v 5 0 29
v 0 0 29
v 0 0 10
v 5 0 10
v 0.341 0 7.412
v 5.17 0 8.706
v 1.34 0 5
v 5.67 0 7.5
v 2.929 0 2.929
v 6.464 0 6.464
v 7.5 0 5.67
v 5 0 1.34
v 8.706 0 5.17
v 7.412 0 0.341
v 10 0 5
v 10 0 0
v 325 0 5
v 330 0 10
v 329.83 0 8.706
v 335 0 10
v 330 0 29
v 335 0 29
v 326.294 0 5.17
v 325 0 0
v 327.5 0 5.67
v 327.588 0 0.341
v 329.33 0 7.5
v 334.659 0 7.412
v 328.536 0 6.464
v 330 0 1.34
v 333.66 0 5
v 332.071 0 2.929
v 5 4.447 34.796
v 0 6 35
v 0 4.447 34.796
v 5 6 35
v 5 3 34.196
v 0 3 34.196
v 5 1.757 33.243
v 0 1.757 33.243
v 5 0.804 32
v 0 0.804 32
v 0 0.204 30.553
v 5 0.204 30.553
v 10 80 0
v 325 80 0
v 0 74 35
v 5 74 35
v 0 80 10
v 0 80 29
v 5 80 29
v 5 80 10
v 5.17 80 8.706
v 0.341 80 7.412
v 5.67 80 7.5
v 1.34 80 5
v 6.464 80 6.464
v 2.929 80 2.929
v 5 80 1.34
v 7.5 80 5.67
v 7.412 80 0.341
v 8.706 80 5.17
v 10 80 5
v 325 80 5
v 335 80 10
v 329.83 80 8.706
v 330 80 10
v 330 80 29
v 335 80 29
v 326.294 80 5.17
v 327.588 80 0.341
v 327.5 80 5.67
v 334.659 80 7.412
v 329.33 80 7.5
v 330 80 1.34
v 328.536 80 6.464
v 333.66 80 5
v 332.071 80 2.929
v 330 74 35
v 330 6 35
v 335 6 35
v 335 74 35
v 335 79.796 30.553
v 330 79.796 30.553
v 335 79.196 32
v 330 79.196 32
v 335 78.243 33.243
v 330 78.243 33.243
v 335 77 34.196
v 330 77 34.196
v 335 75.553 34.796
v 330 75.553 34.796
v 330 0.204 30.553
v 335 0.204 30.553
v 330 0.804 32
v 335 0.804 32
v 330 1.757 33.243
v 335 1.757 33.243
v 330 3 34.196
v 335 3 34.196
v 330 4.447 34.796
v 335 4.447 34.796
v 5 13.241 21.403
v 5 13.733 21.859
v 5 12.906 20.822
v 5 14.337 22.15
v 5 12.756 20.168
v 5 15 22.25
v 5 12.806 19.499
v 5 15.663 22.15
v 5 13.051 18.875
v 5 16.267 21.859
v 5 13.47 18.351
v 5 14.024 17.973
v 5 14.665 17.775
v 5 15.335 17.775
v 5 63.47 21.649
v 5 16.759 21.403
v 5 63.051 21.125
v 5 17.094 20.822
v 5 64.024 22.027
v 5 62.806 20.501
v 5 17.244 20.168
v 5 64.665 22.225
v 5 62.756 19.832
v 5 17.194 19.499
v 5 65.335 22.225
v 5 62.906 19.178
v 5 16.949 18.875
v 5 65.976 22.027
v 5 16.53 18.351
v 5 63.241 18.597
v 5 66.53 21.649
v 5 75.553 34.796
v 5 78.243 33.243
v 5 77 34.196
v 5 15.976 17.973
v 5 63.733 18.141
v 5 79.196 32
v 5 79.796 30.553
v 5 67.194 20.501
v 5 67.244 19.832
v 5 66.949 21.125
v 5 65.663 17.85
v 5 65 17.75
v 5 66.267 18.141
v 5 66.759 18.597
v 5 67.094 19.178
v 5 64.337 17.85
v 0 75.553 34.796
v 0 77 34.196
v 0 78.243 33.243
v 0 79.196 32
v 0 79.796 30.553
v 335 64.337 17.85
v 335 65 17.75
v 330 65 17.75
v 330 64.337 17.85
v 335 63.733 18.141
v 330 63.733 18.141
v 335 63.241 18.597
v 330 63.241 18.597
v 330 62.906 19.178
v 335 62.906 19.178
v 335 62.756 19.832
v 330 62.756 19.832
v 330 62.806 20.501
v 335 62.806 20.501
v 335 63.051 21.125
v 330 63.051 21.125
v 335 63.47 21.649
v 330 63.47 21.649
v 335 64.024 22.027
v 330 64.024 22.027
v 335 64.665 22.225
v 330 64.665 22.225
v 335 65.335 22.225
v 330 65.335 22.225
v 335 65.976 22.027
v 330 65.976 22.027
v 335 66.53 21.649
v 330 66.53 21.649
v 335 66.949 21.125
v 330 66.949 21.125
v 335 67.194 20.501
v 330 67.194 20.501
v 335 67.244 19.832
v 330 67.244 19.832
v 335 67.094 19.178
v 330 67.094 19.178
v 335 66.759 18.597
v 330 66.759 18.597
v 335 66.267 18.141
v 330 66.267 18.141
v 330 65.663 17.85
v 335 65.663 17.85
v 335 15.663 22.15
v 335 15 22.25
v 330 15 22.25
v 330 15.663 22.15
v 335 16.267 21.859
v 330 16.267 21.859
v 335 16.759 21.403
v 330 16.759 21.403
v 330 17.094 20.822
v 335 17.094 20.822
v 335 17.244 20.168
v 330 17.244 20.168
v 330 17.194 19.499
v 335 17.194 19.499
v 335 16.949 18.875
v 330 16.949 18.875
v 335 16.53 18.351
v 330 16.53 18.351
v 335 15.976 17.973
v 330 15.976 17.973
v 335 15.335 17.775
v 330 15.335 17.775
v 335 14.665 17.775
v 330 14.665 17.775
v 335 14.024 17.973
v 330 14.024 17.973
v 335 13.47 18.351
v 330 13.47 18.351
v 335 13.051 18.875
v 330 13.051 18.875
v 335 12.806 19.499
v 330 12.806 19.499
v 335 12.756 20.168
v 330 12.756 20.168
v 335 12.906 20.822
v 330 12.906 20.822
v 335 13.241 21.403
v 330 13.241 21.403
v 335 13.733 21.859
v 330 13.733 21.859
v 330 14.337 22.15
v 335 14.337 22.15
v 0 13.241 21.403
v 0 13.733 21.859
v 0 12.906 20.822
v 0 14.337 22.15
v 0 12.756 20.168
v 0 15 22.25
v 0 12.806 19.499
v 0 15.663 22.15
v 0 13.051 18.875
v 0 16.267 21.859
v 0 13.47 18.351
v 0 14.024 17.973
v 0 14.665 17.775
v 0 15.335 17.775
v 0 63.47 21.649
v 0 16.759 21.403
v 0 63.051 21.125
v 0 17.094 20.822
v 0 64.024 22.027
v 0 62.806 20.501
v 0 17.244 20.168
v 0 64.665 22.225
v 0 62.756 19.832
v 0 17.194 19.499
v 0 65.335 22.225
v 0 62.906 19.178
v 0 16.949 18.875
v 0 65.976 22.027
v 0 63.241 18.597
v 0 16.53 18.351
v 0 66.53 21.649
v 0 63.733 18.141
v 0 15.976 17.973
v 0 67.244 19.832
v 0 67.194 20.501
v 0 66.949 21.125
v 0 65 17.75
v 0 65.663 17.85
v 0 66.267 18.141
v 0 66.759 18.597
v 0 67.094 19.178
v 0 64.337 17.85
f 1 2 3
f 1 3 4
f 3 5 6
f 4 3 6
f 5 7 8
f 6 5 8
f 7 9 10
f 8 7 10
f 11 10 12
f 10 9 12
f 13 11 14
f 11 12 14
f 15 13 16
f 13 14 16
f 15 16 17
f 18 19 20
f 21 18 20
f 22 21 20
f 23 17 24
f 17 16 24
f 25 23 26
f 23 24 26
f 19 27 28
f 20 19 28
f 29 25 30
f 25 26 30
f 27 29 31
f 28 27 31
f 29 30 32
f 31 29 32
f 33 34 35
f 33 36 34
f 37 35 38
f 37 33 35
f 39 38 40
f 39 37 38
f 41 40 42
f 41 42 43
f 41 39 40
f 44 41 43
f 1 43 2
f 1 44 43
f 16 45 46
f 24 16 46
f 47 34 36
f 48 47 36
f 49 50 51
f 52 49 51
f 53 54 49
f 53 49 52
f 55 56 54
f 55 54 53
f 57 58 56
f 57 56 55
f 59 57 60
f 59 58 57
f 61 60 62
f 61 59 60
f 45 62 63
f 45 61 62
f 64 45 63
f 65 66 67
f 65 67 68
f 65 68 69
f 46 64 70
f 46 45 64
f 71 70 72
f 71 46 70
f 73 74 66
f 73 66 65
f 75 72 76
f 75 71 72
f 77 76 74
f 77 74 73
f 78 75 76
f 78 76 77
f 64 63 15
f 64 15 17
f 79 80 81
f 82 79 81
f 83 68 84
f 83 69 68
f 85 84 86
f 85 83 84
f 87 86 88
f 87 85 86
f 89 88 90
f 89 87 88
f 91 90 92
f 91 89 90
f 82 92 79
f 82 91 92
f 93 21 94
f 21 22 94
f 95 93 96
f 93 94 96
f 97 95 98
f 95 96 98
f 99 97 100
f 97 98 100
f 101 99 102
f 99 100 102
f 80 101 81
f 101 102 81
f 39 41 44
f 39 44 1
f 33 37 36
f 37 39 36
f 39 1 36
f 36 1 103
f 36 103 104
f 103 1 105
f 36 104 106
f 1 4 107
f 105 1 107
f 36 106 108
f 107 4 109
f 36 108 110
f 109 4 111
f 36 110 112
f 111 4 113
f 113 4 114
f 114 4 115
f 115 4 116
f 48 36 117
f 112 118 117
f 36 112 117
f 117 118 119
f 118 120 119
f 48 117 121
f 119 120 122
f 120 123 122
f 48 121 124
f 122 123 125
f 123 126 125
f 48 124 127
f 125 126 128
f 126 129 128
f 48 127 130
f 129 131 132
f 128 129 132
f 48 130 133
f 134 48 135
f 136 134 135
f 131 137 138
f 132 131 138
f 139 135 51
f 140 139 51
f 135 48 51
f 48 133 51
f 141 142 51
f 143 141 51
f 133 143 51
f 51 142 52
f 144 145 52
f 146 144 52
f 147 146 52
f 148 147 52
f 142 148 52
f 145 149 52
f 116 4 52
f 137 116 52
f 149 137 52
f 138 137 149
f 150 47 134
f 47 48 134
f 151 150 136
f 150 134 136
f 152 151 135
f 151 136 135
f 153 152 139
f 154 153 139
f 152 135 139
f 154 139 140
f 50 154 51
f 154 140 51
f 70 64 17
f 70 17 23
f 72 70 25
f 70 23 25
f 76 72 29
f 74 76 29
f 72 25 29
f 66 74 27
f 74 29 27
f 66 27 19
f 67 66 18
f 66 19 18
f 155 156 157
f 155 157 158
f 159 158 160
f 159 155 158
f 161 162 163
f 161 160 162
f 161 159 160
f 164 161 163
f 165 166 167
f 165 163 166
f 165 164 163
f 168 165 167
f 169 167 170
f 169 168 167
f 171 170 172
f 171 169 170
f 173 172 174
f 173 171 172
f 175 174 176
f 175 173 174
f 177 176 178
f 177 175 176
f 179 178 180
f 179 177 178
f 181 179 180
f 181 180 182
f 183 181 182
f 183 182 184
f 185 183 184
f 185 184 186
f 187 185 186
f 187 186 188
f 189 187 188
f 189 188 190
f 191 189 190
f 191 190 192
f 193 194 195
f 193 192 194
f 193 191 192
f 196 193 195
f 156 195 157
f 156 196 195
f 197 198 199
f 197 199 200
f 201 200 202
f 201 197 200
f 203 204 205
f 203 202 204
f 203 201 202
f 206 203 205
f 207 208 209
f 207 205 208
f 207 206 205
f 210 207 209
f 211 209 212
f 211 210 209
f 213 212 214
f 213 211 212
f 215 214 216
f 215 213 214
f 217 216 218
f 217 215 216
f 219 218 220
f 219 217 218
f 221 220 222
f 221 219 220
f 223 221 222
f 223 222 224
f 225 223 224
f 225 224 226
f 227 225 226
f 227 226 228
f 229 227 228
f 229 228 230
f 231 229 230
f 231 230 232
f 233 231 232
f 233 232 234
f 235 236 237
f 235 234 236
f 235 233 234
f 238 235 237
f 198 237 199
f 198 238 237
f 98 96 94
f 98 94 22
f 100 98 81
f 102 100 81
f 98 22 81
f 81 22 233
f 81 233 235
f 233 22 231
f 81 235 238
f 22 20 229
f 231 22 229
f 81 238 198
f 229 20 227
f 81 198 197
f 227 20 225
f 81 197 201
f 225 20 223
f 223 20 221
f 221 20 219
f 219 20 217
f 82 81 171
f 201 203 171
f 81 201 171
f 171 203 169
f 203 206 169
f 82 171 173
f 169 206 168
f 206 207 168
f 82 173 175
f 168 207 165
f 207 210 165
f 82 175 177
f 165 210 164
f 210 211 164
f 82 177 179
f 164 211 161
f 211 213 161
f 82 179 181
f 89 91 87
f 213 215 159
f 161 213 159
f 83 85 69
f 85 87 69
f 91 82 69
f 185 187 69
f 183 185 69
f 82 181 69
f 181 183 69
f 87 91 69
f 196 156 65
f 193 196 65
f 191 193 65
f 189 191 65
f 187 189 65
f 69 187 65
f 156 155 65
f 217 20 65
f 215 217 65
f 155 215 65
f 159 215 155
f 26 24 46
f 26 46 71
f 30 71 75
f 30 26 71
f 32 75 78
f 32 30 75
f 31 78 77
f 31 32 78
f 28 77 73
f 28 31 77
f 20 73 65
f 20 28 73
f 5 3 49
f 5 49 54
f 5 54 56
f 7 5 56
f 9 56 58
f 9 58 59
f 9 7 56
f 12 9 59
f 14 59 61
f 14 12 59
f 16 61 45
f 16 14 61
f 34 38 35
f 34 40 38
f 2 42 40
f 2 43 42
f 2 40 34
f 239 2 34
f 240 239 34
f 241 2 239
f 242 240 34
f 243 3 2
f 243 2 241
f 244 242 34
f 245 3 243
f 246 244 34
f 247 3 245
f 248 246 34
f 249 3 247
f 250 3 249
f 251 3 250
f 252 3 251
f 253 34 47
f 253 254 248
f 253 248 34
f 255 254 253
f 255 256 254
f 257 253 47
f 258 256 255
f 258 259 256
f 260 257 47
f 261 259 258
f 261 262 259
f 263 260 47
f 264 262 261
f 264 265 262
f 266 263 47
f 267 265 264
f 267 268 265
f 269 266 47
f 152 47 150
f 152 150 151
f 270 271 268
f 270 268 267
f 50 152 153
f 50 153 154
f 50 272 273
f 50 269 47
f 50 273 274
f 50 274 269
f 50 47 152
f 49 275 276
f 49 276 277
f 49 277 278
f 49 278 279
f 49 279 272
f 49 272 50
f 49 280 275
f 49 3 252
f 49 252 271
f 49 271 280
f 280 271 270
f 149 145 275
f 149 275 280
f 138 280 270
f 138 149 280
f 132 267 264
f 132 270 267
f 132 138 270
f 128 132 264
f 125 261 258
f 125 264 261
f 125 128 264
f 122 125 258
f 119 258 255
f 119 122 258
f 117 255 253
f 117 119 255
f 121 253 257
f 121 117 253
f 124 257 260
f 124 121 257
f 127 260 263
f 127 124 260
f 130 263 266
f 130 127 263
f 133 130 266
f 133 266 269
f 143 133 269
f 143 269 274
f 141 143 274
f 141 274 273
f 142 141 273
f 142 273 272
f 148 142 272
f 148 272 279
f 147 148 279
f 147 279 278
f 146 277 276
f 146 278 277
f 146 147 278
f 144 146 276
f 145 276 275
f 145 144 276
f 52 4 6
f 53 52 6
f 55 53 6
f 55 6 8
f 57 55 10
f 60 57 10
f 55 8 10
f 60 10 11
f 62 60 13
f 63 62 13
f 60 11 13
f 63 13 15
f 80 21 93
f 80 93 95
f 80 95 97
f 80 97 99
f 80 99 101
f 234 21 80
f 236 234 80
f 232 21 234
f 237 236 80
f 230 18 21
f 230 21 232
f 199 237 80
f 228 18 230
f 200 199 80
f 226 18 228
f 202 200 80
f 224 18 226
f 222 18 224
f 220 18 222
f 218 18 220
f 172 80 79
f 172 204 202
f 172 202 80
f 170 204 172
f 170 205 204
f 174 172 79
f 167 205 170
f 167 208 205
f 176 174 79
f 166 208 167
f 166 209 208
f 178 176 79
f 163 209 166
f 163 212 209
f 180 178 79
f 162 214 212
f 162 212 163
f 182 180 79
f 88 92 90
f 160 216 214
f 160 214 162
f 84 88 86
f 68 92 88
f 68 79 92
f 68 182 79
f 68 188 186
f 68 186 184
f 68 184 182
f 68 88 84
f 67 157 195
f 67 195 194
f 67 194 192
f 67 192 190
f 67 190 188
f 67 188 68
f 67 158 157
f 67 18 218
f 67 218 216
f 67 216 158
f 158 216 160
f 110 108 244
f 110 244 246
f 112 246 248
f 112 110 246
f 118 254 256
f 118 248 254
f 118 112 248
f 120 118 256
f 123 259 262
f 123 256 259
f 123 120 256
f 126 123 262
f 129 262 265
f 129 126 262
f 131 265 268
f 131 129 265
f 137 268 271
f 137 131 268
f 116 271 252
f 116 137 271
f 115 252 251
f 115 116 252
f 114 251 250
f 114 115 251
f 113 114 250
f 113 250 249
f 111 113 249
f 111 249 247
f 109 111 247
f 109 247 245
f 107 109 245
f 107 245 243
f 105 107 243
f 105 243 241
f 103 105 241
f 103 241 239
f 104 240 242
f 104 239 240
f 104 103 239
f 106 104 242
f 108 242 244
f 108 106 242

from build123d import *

# Parameters (mm, degrees)
ESQUISSE1_W                  = 335
ESQUISSE1_H                  = 80
BOSS_EXTRU_1_DEPTH           = 5
ESQUISSE2_W                  = 5
ESQUISSE2_H                  = 80
BOSS_EXTRU_2_DEPTH           = 30
ENL_V_MAT_EXTRU_1_DEPTH      = 347.193587462
ENL_V_MAT_EXTRU_1_DEPTH_BACK = 347.193587462
ESQUISSE3_R                  = 2.25
CONG_1_R                     = 6
CONVERTIR_VOLUME2_DEPTH      = 80
CONVERTIR_VOLUME2_2_DEPTH    = 80


# Read off the part's stored shape, not the designer's step: Convertir-Volume2
with BuildPart() as part:
    # Esquisse1 → Boss.-Extru.1 (new body)
    with BuildSketch(Plane.XY):
        with Locations((167.5, 40)):
            Rectangle(ESQUISSE1_W, ESQUISSE1_H)
    extrude(amount=BOSS_EXTRU_1_DEPTH)

    # Esquisse2 → Boss.-Extru.2 (add)
    with BuildSketch(Plane.XY.offset(5)):
        with Locations((2.5, 40)):
            Rectangle(ESQUISSE2_W, ESQUISSE2_H)
        with Locations((332.5, 40)):
            Rectangle(ESQUISSE2_W, ESQUISSE2_H)
    extrude(amount=BOSS_EXTRU_2_DEPTH)

    # Esquisse3 → Enlèv. mat.-Extru.1 (cut, two sides: drawn at the far end of the back side and taken through both)
    with BuildSketch(Plane.ZY.offset(-ENL_V_MAT_EXTRU_1_DEPTH_BACK)):
        with Locations((20, 15)):
            Circle(ESQUISSE3_R)
        with Locations(Location((20, 65, 0), (0, 0, 180))):
            Circle(ESQUISSE3_R)
    extrude(amount=ENL_V_MAT_EXTRU_1_DEPTH + ENL_V_MAT_EXTRU_1_DEPTH_BACK, mode=Mode.SUBTRACT)

    # Congé1
    cong_1_edges = [part.edges().sort_by_distance(p)[0] for p in [
        (2.5, 0, 35),
        (2.5, 80, 35),
        (332.5, 0, 35),
        (332.5, 80, 35),
    ]]
    fillet(cong_1_edges, radius=CONG_1_R)

    # Convertir-Volume2 outline → Convertir-Volume2 (cut)
    with BuildSketch(Plane(origin=(0, 0, 0), x_dir=(1, 0, 0), z_dir=(0, 1, 0))):
        with BuildLine():
            ThreePointArc((0, -10), (2.928932188, -2.928932188), (10, 0))
            Line((10, 0), (0, 0))
            Line((0, 0), (0, -10))
        make_face()
        with BuildLine():
            ThreePointArc((325, 0), (332.071067812, -2.928932188), (335, -10))
            Line((335, -10), (335, 0))
            Line((335, 0), (325, 0))
        make_face()
    extrude(amount=CONVERTIR_VOLUME2_DEPTH, mode=Mode.SUBTRACT)

    # Convertir-Volume2 2 outline → Convertir-Volume2 2 (add)
    with BuildSketch(Plane(origin=(0, 0, 0), x_dir=(1, 0, 0), z_dir=(0, 1, 0))):
        with BuildLine():
            ThreePointArc((5, -10), (6.464466094, -6.464466094), (10, -5))
            Line((10, -5), (5, -5))
            Line((5, -5), (5, -10))
        make_face()
        with BuildLine():
            ThreePointArc((325, -5), (328.535533906, -6.464466094), (330, -10))
            Line((330, -10), (330, -5))
            Line((330, -5), (325, -5))
        make_face()
    extrude(amount=CONVERTIR_VOLUME2_2_DEPTH)


solid = part.part
